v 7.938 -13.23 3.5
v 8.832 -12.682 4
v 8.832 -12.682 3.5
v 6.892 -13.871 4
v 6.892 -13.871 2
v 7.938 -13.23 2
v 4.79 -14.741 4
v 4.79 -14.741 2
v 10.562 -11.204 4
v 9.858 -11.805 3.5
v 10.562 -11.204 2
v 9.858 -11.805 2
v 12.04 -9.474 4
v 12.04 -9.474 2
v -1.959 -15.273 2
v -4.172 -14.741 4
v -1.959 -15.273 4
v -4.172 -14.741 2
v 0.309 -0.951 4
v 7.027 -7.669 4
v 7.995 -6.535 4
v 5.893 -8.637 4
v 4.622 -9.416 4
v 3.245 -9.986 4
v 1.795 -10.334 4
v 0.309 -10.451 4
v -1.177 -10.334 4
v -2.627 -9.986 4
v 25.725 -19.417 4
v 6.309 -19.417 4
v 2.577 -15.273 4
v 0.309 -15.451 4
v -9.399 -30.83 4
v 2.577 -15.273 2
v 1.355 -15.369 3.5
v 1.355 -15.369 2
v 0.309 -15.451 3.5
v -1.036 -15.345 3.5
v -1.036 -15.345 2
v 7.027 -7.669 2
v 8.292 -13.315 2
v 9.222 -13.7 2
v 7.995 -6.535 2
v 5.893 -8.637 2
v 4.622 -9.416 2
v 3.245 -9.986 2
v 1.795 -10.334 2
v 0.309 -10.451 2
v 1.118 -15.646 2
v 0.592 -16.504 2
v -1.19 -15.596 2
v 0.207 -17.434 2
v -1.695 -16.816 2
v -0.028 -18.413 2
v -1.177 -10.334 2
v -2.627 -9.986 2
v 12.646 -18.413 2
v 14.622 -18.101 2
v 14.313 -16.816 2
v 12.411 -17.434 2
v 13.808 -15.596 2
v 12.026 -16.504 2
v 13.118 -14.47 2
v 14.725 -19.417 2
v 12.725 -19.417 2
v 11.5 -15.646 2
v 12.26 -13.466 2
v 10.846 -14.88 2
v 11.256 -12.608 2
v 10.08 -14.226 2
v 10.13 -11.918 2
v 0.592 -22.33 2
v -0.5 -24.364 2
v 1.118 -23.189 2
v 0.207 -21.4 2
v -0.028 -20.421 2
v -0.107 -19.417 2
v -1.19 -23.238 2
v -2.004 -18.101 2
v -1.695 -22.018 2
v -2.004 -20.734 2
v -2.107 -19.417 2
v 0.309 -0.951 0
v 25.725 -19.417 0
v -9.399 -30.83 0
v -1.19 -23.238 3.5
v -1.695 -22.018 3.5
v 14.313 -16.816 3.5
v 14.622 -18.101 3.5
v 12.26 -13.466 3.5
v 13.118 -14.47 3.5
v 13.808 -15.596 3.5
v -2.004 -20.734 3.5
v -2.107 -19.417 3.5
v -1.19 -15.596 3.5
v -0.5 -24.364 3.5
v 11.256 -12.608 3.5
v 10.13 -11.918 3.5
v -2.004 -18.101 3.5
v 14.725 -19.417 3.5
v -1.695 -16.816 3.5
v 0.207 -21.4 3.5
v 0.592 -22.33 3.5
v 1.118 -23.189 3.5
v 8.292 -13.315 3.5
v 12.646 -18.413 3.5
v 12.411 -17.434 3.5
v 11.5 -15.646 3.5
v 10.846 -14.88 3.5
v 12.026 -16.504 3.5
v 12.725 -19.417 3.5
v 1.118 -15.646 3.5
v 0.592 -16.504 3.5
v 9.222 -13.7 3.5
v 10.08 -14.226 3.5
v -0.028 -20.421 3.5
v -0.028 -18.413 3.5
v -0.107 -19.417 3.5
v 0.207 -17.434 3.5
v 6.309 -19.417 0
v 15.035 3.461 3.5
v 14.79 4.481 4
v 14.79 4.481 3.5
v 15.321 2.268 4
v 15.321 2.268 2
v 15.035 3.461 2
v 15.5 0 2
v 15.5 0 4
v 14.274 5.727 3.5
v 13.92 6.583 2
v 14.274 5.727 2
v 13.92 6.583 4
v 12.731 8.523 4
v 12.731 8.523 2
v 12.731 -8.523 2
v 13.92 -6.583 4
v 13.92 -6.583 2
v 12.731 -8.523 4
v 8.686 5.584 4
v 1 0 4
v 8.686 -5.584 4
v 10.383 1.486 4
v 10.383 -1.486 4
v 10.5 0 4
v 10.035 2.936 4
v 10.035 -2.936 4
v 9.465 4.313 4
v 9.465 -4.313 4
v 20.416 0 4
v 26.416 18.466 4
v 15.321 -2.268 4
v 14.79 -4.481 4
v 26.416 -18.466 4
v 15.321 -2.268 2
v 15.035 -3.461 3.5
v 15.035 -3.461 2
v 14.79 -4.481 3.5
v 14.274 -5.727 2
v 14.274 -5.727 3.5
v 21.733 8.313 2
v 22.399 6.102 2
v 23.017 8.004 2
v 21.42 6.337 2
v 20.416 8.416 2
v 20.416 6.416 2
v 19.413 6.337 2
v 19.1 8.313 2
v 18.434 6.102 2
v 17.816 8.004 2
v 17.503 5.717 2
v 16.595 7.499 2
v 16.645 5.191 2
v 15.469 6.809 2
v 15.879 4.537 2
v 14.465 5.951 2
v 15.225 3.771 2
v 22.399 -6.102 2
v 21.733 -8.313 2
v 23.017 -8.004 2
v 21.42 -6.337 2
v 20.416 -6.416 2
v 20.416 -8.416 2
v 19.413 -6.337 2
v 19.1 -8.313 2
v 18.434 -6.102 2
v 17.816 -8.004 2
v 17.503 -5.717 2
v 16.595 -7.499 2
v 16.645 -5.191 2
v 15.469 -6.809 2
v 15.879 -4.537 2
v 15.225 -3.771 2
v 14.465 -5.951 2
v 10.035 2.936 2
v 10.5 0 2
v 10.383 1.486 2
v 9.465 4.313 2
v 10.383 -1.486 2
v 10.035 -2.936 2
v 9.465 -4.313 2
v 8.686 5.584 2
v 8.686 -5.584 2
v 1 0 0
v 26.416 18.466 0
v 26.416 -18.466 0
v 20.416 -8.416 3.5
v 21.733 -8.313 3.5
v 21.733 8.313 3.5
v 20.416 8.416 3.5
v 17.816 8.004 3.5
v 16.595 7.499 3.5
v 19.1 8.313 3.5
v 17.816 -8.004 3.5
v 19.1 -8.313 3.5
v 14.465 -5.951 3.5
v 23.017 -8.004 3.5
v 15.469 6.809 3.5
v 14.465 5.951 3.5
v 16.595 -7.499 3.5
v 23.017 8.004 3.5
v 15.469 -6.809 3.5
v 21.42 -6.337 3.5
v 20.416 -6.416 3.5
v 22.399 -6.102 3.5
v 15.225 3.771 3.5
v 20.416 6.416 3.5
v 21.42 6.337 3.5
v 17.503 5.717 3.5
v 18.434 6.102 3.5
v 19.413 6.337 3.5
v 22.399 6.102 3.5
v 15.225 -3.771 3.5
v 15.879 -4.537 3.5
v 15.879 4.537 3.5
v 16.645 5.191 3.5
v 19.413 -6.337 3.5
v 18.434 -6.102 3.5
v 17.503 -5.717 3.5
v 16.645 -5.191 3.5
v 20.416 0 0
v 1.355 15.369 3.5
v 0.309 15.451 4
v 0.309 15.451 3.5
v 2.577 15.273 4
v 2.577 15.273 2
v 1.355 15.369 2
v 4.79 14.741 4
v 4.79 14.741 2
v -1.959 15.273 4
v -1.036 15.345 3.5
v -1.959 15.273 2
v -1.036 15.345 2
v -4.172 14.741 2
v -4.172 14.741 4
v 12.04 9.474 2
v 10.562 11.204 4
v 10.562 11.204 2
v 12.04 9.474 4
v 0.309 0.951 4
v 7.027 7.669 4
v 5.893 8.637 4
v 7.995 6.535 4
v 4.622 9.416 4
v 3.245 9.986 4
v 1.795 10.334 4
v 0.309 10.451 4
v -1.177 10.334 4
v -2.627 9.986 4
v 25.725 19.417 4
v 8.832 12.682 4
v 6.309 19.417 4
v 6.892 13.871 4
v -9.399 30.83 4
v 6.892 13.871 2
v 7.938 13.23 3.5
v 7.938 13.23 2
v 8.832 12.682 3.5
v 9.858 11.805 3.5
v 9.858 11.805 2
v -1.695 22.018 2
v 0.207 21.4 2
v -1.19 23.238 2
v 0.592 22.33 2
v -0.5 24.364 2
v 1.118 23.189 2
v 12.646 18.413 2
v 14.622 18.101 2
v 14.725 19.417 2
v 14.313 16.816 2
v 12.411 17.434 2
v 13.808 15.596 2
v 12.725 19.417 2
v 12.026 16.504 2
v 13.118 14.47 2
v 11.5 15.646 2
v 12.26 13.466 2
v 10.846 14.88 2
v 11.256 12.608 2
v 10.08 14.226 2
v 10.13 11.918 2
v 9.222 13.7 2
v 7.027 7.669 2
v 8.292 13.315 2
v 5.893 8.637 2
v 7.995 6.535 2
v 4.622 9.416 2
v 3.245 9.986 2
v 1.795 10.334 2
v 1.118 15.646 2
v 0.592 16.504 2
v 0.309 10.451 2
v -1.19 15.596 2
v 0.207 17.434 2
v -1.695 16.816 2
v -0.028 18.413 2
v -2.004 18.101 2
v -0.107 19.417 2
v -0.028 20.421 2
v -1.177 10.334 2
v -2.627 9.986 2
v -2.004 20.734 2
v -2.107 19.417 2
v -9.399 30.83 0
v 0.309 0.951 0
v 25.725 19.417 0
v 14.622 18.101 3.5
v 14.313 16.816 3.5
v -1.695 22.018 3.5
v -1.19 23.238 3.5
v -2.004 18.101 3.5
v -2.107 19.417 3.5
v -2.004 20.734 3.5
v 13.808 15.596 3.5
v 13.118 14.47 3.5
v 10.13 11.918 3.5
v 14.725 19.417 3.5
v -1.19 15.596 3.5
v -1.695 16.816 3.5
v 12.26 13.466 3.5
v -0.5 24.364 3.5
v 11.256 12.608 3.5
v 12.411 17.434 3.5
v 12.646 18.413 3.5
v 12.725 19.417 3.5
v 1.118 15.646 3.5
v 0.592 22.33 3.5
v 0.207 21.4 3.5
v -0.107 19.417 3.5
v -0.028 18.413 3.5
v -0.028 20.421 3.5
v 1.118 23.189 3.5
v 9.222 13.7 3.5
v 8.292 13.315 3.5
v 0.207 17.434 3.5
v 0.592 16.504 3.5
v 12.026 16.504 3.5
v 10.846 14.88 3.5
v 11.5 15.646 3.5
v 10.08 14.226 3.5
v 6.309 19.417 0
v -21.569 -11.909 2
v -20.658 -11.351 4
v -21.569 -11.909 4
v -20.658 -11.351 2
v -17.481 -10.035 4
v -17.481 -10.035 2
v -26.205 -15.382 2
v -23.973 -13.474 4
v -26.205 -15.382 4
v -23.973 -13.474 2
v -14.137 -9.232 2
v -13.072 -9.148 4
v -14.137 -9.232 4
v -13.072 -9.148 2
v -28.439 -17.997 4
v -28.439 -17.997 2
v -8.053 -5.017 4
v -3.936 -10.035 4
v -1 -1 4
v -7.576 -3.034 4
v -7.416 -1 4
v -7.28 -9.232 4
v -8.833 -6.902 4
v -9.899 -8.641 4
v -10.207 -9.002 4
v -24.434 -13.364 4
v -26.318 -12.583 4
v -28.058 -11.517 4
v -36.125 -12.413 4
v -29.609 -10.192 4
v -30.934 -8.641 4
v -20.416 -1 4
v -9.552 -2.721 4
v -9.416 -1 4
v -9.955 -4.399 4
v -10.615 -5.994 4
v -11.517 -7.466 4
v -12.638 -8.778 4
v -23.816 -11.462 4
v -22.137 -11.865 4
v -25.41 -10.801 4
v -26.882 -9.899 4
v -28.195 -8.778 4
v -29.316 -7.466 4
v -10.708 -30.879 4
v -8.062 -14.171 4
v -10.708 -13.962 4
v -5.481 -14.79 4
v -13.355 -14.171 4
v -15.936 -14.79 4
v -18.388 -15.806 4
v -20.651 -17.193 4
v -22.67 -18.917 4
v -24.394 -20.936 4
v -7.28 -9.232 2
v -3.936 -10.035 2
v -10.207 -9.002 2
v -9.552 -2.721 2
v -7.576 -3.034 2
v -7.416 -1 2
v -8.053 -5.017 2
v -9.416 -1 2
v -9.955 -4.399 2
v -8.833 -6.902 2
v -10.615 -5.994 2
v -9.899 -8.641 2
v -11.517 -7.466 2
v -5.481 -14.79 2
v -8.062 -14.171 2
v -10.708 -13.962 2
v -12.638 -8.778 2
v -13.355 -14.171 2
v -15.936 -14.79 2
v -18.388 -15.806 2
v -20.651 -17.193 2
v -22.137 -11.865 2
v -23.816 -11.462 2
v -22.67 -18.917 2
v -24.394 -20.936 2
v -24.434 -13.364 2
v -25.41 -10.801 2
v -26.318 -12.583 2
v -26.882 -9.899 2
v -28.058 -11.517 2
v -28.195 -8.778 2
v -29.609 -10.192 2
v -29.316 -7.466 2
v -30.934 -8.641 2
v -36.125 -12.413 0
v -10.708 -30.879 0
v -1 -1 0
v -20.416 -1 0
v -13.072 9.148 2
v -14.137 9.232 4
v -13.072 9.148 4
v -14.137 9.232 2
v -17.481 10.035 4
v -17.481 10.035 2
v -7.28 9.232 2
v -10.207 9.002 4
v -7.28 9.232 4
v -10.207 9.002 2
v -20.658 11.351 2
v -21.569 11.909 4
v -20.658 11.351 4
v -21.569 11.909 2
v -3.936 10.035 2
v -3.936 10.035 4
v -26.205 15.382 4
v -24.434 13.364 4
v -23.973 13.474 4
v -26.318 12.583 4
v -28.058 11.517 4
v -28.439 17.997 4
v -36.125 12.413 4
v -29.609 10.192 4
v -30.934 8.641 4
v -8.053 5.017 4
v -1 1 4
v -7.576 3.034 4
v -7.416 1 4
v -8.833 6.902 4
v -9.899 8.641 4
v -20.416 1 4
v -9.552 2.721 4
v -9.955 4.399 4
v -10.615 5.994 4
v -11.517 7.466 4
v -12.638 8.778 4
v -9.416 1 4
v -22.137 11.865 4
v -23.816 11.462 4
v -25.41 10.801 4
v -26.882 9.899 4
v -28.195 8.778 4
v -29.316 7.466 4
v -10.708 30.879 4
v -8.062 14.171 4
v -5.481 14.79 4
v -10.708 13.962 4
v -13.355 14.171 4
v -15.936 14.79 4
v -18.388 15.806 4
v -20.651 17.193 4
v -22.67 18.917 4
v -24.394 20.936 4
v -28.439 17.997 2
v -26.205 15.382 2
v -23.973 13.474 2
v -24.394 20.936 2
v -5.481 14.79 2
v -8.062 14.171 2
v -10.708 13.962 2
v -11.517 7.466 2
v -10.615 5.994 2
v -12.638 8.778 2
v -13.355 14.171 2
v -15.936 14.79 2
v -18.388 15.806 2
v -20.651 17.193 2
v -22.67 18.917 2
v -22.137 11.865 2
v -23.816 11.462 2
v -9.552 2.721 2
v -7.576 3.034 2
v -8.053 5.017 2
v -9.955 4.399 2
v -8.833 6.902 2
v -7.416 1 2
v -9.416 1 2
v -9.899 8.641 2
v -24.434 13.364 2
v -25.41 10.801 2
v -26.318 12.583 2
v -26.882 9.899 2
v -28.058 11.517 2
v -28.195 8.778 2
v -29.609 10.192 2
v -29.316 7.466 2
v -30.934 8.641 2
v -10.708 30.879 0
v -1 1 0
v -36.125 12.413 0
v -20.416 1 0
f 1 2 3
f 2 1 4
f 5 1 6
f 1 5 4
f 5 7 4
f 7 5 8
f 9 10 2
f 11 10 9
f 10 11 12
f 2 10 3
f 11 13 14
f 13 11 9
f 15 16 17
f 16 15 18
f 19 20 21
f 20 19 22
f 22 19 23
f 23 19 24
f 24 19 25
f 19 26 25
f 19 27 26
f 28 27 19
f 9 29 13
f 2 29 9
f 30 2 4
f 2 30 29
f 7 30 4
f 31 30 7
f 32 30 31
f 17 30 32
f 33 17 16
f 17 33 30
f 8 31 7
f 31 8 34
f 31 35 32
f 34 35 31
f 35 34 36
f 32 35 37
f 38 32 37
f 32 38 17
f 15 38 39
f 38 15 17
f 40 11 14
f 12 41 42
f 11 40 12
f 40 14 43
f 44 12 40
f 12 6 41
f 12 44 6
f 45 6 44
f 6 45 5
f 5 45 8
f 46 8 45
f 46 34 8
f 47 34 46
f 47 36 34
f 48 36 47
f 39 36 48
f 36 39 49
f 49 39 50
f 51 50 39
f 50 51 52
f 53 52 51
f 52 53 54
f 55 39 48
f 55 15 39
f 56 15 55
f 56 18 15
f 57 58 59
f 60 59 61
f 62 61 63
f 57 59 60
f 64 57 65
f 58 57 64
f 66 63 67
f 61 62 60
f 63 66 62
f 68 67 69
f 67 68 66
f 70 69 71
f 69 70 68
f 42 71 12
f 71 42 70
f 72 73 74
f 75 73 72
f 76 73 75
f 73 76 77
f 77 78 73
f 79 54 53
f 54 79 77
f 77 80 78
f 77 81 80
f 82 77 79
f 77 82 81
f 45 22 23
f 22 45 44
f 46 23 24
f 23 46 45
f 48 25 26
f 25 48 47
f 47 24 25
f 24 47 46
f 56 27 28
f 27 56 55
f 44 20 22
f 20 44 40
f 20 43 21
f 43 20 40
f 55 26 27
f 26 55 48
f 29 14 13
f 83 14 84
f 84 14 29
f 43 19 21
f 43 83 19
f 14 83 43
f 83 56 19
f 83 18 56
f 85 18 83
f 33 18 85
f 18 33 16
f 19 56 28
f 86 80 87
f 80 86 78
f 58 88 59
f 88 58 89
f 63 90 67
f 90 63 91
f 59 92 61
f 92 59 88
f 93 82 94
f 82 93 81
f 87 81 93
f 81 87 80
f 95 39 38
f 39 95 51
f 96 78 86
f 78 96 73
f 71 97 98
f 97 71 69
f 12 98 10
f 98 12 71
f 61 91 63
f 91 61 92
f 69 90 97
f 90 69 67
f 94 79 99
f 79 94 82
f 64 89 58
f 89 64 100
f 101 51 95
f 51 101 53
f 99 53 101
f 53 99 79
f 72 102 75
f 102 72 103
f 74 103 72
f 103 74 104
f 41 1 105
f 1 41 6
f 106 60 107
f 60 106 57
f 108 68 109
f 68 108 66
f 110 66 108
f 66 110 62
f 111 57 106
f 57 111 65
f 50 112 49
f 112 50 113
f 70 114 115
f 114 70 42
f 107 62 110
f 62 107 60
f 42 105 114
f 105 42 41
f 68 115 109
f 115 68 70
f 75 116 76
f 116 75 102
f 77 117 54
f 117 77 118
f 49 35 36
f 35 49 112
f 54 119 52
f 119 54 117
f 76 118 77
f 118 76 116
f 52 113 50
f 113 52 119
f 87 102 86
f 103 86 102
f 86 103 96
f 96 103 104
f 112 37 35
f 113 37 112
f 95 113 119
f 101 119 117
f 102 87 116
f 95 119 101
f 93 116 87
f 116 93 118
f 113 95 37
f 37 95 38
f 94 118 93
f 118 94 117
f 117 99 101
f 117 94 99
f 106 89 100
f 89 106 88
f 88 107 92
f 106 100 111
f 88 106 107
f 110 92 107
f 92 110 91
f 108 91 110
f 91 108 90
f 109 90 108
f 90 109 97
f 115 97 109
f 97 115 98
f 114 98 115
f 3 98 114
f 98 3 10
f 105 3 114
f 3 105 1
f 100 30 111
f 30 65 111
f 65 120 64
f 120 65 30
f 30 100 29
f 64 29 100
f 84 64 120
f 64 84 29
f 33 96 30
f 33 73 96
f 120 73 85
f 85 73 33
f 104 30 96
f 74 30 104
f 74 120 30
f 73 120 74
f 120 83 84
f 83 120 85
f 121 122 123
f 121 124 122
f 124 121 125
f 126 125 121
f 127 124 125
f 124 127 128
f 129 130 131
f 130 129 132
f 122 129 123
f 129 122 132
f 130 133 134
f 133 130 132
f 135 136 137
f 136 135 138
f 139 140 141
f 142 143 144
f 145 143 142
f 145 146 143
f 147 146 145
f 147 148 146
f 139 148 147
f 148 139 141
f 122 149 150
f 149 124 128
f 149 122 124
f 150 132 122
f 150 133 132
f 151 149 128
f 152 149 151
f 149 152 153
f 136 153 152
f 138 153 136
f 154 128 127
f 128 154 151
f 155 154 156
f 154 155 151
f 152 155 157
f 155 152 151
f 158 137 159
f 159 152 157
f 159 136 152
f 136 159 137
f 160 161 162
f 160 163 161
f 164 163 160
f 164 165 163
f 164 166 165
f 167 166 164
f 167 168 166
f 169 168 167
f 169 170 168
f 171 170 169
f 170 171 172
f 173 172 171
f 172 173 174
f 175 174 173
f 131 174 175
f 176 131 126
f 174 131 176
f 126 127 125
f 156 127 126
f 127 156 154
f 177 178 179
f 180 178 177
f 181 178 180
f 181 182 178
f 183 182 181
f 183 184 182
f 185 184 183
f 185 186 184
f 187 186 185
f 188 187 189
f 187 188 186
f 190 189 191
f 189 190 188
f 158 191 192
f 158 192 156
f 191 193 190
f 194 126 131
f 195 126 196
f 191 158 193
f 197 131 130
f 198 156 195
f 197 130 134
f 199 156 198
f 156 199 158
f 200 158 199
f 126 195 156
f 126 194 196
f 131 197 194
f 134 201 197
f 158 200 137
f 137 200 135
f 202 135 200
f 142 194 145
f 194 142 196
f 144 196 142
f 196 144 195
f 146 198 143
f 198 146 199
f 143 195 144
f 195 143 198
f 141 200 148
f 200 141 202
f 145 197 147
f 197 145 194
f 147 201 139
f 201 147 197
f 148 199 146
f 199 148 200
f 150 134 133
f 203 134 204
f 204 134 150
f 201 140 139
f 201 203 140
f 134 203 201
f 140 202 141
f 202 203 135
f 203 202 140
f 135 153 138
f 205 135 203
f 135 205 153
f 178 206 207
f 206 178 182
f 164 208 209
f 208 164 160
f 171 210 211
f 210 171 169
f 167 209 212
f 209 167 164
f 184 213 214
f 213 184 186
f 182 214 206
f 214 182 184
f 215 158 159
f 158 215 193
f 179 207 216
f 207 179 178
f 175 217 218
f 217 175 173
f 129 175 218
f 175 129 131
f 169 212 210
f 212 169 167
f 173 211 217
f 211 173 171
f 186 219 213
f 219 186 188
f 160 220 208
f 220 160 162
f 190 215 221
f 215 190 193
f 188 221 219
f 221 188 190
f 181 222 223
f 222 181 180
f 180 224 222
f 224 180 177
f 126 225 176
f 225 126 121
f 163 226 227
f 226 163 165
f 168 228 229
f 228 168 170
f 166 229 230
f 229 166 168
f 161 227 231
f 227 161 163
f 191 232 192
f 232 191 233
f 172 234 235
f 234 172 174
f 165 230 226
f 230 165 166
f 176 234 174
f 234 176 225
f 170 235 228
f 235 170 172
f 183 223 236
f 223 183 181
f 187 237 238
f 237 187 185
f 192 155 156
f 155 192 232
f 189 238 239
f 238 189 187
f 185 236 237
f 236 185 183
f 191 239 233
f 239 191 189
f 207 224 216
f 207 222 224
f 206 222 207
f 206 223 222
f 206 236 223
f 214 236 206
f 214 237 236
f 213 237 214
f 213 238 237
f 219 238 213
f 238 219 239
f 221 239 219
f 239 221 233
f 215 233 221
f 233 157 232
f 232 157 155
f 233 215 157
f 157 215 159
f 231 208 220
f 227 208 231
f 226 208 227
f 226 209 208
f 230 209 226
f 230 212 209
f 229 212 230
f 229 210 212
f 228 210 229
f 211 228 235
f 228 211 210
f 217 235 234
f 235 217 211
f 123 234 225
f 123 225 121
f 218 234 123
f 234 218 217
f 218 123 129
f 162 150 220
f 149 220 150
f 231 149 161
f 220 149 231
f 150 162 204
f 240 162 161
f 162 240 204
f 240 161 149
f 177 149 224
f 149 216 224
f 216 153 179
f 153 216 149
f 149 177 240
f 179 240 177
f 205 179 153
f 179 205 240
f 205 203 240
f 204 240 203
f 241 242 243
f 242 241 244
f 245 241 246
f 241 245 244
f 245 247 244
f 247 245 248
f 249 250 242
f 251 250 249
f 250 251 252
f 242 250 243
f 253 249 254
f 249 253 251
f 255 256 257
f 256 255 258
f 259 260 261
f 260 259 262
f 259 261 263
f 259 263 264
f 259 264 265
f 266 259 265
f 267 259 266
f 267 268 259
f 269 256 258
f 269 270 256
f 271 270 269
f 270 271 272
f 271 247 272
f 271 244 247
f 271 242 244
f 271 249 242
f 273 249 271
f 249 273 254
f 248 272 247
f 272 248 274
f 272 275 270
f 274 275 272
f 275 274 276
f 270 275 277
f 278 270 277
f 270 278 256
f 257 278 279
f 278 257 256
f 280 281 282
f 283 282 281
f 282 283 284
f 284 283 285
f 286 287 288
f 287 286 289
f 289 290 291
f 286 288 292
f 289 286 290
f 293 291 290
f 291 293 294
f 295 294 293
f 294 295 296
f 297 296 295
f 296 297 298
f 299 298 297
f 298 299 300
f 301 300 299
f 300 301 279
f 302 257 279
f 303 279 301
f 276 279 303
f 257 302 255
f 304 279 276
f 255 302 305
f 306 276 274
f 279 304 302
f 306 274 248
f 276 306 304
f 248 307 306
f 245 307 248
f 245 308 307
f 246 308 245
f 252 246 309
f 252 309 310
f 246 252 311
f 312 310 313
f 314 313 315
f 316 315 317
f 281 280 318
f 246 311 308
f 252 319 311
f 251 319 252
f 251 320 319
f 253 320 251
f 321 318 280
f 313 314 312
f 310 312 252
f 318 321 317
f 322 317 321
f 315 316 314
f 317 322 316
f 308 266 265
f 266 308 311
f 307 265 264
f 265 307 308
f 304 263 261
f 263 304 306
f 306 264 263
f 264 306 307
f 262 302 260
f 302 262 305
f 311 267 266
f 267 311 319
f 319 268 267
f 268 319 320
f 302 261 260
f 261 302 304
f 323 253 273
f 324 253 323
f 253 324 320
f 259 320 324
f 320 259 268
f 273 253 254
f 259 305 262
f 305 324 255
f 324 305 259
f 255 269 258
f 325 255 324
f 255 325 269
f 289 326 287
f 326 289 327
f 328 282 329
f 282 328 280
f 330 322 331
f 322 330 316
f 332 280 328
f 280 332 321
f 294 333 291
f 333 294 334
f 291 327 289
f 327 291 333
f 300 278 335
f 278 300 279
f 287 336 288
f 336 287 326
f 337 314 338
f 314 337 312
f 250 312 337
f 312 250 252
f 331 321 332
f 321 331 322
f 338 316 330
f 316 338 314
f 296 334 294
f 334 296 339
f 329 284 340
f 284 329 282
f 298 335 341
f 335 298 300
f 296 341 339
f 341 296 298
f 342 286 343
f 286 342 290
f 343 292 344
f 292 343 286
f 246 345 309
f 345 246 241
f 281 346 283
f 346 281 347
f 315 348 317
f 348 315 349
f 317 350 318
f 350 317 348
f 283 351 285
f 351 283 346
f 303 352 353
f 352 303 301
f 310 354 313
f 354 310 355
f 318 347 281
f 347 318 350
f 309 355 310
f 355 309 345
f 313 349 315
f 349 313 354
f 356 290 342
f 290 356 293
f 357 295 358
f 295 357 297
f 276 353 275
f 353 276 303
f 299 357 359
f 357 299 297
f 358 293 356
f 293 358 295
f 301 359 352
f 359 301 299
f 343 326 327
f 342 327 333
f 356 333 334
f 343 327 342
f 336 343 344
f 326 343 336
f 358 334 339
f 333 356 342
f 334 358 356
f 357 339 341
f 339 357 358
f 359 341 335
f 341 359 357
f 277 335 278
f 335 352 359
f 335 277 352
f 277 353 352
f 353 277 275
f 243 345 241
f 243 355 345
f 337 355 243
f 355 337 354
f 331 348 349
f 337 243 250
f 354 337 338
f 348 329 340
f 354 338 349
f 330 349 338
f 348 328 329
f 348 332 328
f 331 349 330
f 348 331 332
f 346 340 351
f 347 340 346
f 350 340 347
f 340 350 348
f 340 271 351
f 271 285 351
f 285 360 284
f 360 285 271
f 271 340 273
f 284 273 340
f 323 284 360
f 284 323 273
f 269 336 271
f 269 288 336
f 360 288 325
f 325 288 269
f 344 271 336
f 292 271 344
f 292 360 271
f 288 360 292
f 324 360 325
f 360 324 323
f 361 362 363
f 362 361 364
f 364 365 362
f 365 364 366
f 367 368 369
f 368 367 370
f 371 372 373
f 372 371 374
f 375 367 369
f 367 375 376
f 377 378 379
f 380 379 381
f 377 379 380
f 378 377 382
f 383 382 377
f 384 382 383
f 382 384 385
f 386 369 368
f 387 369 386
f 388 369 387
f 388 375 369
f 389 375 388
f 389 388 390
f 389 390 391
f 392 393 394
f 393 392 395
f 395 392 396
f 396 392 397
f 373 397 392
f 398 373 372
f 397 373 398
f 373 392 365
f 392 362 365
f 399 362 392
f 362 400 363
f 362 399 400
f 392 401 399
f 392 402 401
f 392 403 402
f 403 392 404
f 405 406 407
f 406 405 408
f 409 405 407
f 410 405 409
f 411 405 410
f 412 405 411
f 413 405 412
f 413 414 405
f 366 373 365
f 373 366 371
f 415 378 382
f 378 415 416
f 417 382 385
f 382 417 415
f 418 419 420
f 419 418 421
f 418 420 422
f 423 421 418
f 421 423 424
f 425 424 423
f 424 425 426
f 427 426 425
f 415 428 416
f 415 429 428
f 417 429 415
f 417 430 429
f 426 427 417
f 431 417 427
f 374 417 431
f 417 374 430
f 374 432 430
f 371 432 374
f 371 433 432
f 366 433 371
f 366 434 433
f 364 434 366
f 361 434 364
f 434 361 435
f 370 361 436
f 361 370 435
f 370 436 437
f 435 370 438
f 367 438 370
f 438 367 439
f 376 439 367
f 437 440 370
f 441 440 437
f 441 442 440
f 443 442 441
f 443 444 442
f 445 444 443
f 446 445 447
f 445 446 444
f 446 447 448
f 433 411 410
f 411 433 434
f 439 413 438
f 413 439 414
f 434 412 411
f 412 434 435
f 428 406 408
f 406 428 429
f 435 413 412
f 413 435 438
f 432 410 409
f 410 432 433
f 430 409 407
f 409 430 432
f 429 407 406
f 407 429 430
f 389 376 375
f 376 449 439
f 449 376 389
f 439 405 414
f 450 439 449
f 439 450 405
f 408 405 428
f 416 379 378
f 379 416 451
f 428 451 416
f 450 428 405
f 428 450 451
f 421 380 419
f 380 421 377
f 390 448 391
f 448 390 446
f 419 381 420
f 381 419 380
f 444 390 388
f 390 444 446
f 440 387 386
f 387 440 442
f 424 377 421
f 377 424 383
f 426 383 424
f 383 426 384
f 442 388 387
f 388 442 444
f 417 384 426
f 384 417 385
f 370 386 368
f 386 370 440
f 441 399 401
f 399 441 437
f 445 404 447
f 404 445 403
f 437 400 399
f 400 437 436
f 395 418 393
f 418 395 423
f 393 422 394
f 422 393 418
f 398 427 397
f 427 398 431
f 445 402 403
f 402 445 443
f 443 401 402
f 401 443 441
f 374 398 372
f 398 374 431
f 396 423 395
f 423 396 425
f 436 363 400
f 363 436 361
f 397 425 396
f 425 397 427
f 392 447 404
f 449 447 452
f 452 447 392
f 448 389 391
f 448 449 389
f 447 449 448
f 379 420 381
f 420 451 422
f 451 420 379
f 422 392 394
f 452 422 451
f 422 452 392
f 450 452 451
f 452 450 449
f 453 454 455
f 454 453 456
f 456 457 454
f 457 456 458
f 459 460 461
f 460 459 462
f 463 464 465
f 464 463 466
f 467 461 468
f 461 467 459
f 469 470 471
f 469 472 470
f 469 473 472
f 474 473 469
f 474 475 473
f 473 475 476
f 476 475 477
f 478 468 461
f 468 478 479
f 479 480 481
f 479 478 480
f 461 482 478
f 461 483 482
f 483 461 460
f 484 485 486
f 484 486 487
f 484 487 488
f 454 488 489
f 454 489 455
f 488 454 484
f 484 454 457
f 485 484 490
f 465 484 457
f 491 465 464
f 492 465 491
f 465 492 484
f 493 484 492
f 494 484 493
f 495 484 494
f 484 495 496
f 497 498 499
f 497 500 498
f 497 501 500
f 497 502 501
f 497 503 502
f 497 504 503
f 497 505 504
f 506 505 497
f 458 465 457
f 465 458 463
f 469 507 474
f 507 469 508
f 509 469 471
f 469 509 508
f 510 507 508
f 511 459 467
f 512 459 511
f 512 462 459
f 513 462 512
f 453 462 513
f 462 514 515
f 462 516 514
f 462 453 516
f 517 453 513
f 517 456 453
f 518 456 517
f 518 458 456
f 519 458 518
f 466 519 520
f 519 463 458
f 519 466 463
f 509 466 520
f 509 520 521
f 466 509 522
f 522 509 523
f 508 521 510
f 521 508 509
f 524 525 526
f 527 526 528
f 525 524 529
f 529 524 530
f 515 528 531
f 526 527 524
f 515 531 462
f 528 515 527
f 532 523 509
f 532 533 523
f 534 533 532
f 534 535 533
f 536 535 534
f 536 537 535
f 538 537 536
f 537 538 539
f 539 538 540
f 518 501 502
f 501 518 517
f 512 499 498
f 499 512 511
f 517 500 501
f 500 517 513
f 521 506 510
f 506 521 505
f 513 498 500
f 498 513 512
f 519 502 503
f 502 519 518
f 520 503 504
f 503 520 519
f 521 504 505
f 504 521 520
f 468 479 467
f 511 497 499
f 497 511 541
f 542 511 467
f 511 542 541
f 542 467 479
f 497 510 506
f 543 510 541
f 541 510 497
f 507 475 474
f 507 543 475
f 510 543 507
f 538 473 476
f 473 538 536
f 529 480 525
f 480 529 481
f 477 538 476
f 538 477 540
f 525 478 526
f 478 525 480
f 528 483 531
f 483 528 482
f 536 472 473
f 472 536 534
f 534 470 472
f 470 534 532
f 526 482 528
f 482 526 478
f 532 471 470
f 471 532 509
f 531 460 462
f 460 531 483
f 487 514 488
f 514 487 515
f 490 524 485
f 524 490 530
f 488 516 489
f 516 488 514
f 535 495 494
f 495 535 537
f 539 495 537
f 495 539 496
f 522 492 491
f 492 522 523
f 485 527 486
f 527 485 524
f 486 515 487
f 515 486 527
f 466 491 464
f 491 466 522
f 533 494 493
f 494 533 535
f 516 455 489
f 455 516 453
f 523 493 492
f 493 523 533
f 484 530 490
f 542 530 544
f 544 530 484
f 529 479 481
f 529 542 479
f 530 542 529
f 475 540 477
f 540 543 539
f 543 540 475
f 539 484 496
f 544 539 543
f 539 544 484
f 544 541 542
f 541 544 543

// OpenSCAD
////////////////////////////// 
// kitesanddarts.scad
// http://www.thingiverse.com/thing:12003
// Matt Moses, 2011
// mmoses152@gmail.com
//
// Kites and Darts are a type of non-periodic tiling invented by Roger Penrose.  
// The tiles cover the plane in an infinite variety of beautiful, non-repeating patterns.  
// The Golden Ratio (1/2)*(1+sqrt(5)) features prominently in the tiles, in their
// construction and in their patterns.  In the limit, the ratio of kites to darts is the
// golden ratio.  So if you print 1000 darts you should print 1618 kites.  
// There are seven ways the tiles can be arranged around a vertex.  
// These seven patterns were given names by John Conway and appear in the 
// stl files: sun, star, ace, deuce, jack, queen, king.
// See these links for more information:
// http://intendo.net/penrose/info.html
// http://mathworld.wolfram.com/PenroseTiles.html
// http://en.wikipedia.org/wiki/Penrose_tiling

phi = (1 + sqrt(5))/2;
ca = cos(36);
sa = sin(36);
$fn = 40;

kscale = 12;
hkite = 4;
hmark = 2;
bigmark = 2.5;
littlemark = 1;
explode = 2;

//kite(kscale, hkite, hmark, bigmark, littlemark,explode);
//dart(kscale, hkite, hmark, bigmark, littlemark,explode);
//kitemarkings(kscale, hkite, 5*hmark, bigmark, littlemark,explode);
//dartmarkings(kscale, hkite, 5*hmark, bigmark, littlemark,explode);

//sun(kscale, hkite, hmark, bigmark, littlemark,explode);
//star(kscale, hkite, hmark, bigmark, littlemark,explode);
//ace(kscale, hkite, hmark, bigmark, littlemark,explode);
//deuce(kscale, hkite, hmark, bigmark, littlemark,explode);
//jack(kscale, hkite, hmark, bigmark, littlemark,explode);
//queen(kscale, hkite, hmark, bigmark, littlemark,explode);
king(kscale, hkite, hmark, bigmark, littlemark,explode);


//---------------------------------------------------
module sun(kscale, hkite, hmark, bigmark, littlemark,explode)
{
	for (i = [0, 1, 2, 3, 4, 5])
	{
		rotate(72*i, [0,0,1])
		translate([explode,0,0])
		kite(kscale,hkite,hmark,bigmark,littlemark);
	}
}
//---------------------------------------------------


//---------------------------------------------------
module star(kscale, hkite, hmark, bigmark, littlemark,explode)
{
	for (i = [0, 1, 2, 3, 4, 5])
	{
		rotate(72*i, [0,0,1])
		translate([explode,0,0])
		dart(kscale,hkite,hmark,bigmark,littlemark);
	}
}
//---------------------------------------------------


//---------------------------------------------------
module ace(kscale, hkite, hmark, bigmark, littlemark,explode)
{
	rotate(180,[0,0,1])
	translate([-kscale*(1+1/phi),0,0])
	{
		translate([-explode,0,0])
		dart(kscale,hkite,hmark,bigmark,littlemark);
		
		translate([kscale*(2 + phi + 1/phi), explode/2, 0])
		rotate(180-36,[0,0,1])
			kite(kscale,hkite,hmark,bigmark,littlemark);

		translate([kscale*(2 + phi + 1/phi), -explode/2, 0])
		rotate(180+36,[0,0,1])
			kite(kscale,hkite,hmark,bigmark,littlemark);
	}
}
//---------------------------------------------------


//---------------------------------------------------
module deuce(kscale, hkite, hmark, bigmark, littlemark,explode)
{
	rotate(180,[0,0,1]){ 	

	translate([-kscale*(1+phi),0,0])
	{
		translate([-explode,-explode/2,0])
		rotate(-36,[0,0,1])
		dart(kscale,hkite,hmark,bigmark,littlemark);

		translate([-explode, explode/2, 0])
		rotate(36,[0,0,1])
		dart(kscale,hkite,hmark,bigmark,littlemark);
	}

	translate([0,explode/2,0])
	rotate(72,[0,0,1])
	translate([kscale*(1+phi),0,0])
	rotate(180,[0,0,1])
	kite(kscale,hkite,hmark,bigmark,littlemark);

	translate([0,-explode/2,0])
	rotate(-72,[0,0,1])
	translate([kscale*(1+phi),0,0])
	rotate(180,[0,0,1])
	kite(kscale,hkite,hmark,bigmark,littlemark);

	}
}
//---------------------------------------------------


//---------------------------------------------------
module jack(kscale, hkite, hmark, bigmark, littlemark,explode)
{

	translate([-kscale*(1+phi)-explode/2,0,0])
	kite(kscale,hkite,hmark,bigmark,littlemark);

	translate([explode/2, explode/2, 0])
	rotate(36,[0,0,1])
	kite(kscale,hkite,hmark,bigmark,littlemark);

	translate([explode/2, -explode/2, 0])
	rotate(-36,[0,0,1])
	kite(kscale,hkite,hmark,bigmark,littlemark);

	translate([0,explode,0])
	rotate(180+36,[0,0,1])
	translate([-kscale*(1+phi)*cos(36),-kscale*(1+phi)*sin(36),0])
	dart(kscale,hkite,hmark,bigmark,littlemark);

	translate([0,-explode,0])
	rotate(180-36,[0,0,1])
	translate([-kscale*(1+phi)*cos(36),kscale*(1+phi)*sin(36),0])
	dart(kscale,hkite,hmark,bigmark,littlemark);

}
//---------------------------------------------------


//---------------------------------------------------
module queen(kscale, hkite, hmark, bigmark, littlemark,explode)
{
	translate([-explode/2, explode/2, 0])
	translate([-kscale*(1+phi),0,0])
	rotate(36,[0,0,1])
	kite(kscale,hkite,hmark,bigmark,littlemark);

	translate([-explode/2, -explode/2, 0])
	translate([-kscale*(1+phi),0,0])
	rotate(-36,[0,0,1])
	kite(kscale,hkite,hmark,bigmark,littlemark);

	dart(kscale,hkite,hmark,bigmark,littlemark);

	translate([kscale*(1+phi)*cos(36), kscale*(1+phi)*sin(36)+explode,0])
	rotate(180,[0,0,1])
	kite(kscale,hkite,hmark,bigmark,littlemark);

	translate([kscale*(1+phi)*cos(36), -kscale*(1+phi)*sin(36)-explode,0])
	rotate(180,[0,0,1])
	kite(kscale,hkite,hmark,bigmark,littlemark);
}
//---------------------------------------------------


//---------------------------------------------------
module king(kscale, hkite, hmark, bigmark, littlemark,explode)
{
	for (i = [-1, 0, 1])
	{
		rotate(72*i, [0,0,1])
		translate([explode/2,0,0])
		dart(kscale,hkite,hmark,bigmark,littlemark);
	}

	translate([-kscale*(1+phi)*sin(18) -explode/2, -kscale*(1+phi)*cos(18)-explode/2,0])
	rotate(108, [0,0,1])
	kite(kscale,hkite,hmark,bigmark,littlemark);

	translate([-kscale*(1+phi)*sin(18) -explode/2, kscale*(1+phi)*cos(18)+explode/2,0])
	rotate(-108, [0,0,1])
	kite(kscale,hkite,hmark,bigmark,littlemark);
	
}
//---------------------------------------------------


//---------------------------------------------------
module kite(kscale, hkite, hmark, bigmark, littlemark)
{
difference(){
	kitebase(kscale, hkite);
	translate([0,0,hmark])
	kitemarkings(kscale, hkite, hmark, bigmark, littlemark);
}
}
//---------------------------------------------------


//---------------------------------------------------
module kitebase(kscale, hkite)
{
	linear_extrude(height = hkite, convexity = 10, twist = 0)
	polygon( points = [ [0,0], 
				[kscale*(1+phi)*ca, -kscale*(1+phi)*sa],
				[kscale*(1+phi), 0],
				[kscale*(1+phi)*ca, kscale*(1+phi)*sa] ]);
}
//---------------------------------------------------


//---------------------------------------------------
module kitemarkings(kscale, hkite, hmark, bigmark, littlemark)
{
	intersection(){
		kitebase(kscale, hmark);
		difference(){
			cylinder(r = kscale*phi + bigmark, h = hmark);
			translate([0,0,-0.05*hmark])
			cylinder(r = kscale*phi - bigmark, h = 1.1*hmark);
		}
	}
	intersection(){
		kitebase(kscale, hmark);
		translate([kscale*(1+phi),0,0])
		difference(){
			cylinder(r = kscale+littlemark, h = hmark);
			translate([0,0,-0.05*hmark])
			cylinder(r = kscale-littlemark, h = 1.1*hmark);
		}
	}
}
//---------------------------------------------------


//---------------------------------------------------
module dart(kscale, hkite, hmark, bigmark, littlemark)
{
    difference(){dartbase(kscale, hkite);
	translate([0,0,hmark])
	dartmarkings(kscale, hkite, hmark, bigmark, littlemark);
    }
}
//---------------------------------------------------


//---------------------------------------------------
module dartbase(kscale, hkite)
{
	linear_extrude(height = hkite, convexity = 10, twist = 0)
	polygon( points = [ [0,0], 
				[kscale*(1+phi)*ca, -kscale*(1+phi)*sa],
				[kscale*(1+1/phi), 0],
				[kscale*(1+phi)*ca, kscale*(1+phi)*sa] ]);
}
//---------------------------------------------------


//---------------------------------------------------
module dartmarkings(kscale, hkite, hmark, bigmark, littlemark)
{
	intersection(){
		dartbase(kscale, hmark);
		difference(){
			cylinder(r = kscale + bigmark, h = hmark);
			translate([0,0,-0.05*hmark])
			cylinder(r = kscale - bigmark, h = 1.1*hmark);
		}
	}
	intersection(){
		dartbase(kscale, hmark-0.5);
		translate([kscale*(1+1/phi),0,0])
		difference(){
			cylinder(r = kscale/phi+littlemark, h = hmark);
			translate([0,0,-0.05*hmark])
			cylinder(r = kscale/phi-littlemark, h = 1.1*hmark);
		}
	}
}
//---------------------------------------------------
